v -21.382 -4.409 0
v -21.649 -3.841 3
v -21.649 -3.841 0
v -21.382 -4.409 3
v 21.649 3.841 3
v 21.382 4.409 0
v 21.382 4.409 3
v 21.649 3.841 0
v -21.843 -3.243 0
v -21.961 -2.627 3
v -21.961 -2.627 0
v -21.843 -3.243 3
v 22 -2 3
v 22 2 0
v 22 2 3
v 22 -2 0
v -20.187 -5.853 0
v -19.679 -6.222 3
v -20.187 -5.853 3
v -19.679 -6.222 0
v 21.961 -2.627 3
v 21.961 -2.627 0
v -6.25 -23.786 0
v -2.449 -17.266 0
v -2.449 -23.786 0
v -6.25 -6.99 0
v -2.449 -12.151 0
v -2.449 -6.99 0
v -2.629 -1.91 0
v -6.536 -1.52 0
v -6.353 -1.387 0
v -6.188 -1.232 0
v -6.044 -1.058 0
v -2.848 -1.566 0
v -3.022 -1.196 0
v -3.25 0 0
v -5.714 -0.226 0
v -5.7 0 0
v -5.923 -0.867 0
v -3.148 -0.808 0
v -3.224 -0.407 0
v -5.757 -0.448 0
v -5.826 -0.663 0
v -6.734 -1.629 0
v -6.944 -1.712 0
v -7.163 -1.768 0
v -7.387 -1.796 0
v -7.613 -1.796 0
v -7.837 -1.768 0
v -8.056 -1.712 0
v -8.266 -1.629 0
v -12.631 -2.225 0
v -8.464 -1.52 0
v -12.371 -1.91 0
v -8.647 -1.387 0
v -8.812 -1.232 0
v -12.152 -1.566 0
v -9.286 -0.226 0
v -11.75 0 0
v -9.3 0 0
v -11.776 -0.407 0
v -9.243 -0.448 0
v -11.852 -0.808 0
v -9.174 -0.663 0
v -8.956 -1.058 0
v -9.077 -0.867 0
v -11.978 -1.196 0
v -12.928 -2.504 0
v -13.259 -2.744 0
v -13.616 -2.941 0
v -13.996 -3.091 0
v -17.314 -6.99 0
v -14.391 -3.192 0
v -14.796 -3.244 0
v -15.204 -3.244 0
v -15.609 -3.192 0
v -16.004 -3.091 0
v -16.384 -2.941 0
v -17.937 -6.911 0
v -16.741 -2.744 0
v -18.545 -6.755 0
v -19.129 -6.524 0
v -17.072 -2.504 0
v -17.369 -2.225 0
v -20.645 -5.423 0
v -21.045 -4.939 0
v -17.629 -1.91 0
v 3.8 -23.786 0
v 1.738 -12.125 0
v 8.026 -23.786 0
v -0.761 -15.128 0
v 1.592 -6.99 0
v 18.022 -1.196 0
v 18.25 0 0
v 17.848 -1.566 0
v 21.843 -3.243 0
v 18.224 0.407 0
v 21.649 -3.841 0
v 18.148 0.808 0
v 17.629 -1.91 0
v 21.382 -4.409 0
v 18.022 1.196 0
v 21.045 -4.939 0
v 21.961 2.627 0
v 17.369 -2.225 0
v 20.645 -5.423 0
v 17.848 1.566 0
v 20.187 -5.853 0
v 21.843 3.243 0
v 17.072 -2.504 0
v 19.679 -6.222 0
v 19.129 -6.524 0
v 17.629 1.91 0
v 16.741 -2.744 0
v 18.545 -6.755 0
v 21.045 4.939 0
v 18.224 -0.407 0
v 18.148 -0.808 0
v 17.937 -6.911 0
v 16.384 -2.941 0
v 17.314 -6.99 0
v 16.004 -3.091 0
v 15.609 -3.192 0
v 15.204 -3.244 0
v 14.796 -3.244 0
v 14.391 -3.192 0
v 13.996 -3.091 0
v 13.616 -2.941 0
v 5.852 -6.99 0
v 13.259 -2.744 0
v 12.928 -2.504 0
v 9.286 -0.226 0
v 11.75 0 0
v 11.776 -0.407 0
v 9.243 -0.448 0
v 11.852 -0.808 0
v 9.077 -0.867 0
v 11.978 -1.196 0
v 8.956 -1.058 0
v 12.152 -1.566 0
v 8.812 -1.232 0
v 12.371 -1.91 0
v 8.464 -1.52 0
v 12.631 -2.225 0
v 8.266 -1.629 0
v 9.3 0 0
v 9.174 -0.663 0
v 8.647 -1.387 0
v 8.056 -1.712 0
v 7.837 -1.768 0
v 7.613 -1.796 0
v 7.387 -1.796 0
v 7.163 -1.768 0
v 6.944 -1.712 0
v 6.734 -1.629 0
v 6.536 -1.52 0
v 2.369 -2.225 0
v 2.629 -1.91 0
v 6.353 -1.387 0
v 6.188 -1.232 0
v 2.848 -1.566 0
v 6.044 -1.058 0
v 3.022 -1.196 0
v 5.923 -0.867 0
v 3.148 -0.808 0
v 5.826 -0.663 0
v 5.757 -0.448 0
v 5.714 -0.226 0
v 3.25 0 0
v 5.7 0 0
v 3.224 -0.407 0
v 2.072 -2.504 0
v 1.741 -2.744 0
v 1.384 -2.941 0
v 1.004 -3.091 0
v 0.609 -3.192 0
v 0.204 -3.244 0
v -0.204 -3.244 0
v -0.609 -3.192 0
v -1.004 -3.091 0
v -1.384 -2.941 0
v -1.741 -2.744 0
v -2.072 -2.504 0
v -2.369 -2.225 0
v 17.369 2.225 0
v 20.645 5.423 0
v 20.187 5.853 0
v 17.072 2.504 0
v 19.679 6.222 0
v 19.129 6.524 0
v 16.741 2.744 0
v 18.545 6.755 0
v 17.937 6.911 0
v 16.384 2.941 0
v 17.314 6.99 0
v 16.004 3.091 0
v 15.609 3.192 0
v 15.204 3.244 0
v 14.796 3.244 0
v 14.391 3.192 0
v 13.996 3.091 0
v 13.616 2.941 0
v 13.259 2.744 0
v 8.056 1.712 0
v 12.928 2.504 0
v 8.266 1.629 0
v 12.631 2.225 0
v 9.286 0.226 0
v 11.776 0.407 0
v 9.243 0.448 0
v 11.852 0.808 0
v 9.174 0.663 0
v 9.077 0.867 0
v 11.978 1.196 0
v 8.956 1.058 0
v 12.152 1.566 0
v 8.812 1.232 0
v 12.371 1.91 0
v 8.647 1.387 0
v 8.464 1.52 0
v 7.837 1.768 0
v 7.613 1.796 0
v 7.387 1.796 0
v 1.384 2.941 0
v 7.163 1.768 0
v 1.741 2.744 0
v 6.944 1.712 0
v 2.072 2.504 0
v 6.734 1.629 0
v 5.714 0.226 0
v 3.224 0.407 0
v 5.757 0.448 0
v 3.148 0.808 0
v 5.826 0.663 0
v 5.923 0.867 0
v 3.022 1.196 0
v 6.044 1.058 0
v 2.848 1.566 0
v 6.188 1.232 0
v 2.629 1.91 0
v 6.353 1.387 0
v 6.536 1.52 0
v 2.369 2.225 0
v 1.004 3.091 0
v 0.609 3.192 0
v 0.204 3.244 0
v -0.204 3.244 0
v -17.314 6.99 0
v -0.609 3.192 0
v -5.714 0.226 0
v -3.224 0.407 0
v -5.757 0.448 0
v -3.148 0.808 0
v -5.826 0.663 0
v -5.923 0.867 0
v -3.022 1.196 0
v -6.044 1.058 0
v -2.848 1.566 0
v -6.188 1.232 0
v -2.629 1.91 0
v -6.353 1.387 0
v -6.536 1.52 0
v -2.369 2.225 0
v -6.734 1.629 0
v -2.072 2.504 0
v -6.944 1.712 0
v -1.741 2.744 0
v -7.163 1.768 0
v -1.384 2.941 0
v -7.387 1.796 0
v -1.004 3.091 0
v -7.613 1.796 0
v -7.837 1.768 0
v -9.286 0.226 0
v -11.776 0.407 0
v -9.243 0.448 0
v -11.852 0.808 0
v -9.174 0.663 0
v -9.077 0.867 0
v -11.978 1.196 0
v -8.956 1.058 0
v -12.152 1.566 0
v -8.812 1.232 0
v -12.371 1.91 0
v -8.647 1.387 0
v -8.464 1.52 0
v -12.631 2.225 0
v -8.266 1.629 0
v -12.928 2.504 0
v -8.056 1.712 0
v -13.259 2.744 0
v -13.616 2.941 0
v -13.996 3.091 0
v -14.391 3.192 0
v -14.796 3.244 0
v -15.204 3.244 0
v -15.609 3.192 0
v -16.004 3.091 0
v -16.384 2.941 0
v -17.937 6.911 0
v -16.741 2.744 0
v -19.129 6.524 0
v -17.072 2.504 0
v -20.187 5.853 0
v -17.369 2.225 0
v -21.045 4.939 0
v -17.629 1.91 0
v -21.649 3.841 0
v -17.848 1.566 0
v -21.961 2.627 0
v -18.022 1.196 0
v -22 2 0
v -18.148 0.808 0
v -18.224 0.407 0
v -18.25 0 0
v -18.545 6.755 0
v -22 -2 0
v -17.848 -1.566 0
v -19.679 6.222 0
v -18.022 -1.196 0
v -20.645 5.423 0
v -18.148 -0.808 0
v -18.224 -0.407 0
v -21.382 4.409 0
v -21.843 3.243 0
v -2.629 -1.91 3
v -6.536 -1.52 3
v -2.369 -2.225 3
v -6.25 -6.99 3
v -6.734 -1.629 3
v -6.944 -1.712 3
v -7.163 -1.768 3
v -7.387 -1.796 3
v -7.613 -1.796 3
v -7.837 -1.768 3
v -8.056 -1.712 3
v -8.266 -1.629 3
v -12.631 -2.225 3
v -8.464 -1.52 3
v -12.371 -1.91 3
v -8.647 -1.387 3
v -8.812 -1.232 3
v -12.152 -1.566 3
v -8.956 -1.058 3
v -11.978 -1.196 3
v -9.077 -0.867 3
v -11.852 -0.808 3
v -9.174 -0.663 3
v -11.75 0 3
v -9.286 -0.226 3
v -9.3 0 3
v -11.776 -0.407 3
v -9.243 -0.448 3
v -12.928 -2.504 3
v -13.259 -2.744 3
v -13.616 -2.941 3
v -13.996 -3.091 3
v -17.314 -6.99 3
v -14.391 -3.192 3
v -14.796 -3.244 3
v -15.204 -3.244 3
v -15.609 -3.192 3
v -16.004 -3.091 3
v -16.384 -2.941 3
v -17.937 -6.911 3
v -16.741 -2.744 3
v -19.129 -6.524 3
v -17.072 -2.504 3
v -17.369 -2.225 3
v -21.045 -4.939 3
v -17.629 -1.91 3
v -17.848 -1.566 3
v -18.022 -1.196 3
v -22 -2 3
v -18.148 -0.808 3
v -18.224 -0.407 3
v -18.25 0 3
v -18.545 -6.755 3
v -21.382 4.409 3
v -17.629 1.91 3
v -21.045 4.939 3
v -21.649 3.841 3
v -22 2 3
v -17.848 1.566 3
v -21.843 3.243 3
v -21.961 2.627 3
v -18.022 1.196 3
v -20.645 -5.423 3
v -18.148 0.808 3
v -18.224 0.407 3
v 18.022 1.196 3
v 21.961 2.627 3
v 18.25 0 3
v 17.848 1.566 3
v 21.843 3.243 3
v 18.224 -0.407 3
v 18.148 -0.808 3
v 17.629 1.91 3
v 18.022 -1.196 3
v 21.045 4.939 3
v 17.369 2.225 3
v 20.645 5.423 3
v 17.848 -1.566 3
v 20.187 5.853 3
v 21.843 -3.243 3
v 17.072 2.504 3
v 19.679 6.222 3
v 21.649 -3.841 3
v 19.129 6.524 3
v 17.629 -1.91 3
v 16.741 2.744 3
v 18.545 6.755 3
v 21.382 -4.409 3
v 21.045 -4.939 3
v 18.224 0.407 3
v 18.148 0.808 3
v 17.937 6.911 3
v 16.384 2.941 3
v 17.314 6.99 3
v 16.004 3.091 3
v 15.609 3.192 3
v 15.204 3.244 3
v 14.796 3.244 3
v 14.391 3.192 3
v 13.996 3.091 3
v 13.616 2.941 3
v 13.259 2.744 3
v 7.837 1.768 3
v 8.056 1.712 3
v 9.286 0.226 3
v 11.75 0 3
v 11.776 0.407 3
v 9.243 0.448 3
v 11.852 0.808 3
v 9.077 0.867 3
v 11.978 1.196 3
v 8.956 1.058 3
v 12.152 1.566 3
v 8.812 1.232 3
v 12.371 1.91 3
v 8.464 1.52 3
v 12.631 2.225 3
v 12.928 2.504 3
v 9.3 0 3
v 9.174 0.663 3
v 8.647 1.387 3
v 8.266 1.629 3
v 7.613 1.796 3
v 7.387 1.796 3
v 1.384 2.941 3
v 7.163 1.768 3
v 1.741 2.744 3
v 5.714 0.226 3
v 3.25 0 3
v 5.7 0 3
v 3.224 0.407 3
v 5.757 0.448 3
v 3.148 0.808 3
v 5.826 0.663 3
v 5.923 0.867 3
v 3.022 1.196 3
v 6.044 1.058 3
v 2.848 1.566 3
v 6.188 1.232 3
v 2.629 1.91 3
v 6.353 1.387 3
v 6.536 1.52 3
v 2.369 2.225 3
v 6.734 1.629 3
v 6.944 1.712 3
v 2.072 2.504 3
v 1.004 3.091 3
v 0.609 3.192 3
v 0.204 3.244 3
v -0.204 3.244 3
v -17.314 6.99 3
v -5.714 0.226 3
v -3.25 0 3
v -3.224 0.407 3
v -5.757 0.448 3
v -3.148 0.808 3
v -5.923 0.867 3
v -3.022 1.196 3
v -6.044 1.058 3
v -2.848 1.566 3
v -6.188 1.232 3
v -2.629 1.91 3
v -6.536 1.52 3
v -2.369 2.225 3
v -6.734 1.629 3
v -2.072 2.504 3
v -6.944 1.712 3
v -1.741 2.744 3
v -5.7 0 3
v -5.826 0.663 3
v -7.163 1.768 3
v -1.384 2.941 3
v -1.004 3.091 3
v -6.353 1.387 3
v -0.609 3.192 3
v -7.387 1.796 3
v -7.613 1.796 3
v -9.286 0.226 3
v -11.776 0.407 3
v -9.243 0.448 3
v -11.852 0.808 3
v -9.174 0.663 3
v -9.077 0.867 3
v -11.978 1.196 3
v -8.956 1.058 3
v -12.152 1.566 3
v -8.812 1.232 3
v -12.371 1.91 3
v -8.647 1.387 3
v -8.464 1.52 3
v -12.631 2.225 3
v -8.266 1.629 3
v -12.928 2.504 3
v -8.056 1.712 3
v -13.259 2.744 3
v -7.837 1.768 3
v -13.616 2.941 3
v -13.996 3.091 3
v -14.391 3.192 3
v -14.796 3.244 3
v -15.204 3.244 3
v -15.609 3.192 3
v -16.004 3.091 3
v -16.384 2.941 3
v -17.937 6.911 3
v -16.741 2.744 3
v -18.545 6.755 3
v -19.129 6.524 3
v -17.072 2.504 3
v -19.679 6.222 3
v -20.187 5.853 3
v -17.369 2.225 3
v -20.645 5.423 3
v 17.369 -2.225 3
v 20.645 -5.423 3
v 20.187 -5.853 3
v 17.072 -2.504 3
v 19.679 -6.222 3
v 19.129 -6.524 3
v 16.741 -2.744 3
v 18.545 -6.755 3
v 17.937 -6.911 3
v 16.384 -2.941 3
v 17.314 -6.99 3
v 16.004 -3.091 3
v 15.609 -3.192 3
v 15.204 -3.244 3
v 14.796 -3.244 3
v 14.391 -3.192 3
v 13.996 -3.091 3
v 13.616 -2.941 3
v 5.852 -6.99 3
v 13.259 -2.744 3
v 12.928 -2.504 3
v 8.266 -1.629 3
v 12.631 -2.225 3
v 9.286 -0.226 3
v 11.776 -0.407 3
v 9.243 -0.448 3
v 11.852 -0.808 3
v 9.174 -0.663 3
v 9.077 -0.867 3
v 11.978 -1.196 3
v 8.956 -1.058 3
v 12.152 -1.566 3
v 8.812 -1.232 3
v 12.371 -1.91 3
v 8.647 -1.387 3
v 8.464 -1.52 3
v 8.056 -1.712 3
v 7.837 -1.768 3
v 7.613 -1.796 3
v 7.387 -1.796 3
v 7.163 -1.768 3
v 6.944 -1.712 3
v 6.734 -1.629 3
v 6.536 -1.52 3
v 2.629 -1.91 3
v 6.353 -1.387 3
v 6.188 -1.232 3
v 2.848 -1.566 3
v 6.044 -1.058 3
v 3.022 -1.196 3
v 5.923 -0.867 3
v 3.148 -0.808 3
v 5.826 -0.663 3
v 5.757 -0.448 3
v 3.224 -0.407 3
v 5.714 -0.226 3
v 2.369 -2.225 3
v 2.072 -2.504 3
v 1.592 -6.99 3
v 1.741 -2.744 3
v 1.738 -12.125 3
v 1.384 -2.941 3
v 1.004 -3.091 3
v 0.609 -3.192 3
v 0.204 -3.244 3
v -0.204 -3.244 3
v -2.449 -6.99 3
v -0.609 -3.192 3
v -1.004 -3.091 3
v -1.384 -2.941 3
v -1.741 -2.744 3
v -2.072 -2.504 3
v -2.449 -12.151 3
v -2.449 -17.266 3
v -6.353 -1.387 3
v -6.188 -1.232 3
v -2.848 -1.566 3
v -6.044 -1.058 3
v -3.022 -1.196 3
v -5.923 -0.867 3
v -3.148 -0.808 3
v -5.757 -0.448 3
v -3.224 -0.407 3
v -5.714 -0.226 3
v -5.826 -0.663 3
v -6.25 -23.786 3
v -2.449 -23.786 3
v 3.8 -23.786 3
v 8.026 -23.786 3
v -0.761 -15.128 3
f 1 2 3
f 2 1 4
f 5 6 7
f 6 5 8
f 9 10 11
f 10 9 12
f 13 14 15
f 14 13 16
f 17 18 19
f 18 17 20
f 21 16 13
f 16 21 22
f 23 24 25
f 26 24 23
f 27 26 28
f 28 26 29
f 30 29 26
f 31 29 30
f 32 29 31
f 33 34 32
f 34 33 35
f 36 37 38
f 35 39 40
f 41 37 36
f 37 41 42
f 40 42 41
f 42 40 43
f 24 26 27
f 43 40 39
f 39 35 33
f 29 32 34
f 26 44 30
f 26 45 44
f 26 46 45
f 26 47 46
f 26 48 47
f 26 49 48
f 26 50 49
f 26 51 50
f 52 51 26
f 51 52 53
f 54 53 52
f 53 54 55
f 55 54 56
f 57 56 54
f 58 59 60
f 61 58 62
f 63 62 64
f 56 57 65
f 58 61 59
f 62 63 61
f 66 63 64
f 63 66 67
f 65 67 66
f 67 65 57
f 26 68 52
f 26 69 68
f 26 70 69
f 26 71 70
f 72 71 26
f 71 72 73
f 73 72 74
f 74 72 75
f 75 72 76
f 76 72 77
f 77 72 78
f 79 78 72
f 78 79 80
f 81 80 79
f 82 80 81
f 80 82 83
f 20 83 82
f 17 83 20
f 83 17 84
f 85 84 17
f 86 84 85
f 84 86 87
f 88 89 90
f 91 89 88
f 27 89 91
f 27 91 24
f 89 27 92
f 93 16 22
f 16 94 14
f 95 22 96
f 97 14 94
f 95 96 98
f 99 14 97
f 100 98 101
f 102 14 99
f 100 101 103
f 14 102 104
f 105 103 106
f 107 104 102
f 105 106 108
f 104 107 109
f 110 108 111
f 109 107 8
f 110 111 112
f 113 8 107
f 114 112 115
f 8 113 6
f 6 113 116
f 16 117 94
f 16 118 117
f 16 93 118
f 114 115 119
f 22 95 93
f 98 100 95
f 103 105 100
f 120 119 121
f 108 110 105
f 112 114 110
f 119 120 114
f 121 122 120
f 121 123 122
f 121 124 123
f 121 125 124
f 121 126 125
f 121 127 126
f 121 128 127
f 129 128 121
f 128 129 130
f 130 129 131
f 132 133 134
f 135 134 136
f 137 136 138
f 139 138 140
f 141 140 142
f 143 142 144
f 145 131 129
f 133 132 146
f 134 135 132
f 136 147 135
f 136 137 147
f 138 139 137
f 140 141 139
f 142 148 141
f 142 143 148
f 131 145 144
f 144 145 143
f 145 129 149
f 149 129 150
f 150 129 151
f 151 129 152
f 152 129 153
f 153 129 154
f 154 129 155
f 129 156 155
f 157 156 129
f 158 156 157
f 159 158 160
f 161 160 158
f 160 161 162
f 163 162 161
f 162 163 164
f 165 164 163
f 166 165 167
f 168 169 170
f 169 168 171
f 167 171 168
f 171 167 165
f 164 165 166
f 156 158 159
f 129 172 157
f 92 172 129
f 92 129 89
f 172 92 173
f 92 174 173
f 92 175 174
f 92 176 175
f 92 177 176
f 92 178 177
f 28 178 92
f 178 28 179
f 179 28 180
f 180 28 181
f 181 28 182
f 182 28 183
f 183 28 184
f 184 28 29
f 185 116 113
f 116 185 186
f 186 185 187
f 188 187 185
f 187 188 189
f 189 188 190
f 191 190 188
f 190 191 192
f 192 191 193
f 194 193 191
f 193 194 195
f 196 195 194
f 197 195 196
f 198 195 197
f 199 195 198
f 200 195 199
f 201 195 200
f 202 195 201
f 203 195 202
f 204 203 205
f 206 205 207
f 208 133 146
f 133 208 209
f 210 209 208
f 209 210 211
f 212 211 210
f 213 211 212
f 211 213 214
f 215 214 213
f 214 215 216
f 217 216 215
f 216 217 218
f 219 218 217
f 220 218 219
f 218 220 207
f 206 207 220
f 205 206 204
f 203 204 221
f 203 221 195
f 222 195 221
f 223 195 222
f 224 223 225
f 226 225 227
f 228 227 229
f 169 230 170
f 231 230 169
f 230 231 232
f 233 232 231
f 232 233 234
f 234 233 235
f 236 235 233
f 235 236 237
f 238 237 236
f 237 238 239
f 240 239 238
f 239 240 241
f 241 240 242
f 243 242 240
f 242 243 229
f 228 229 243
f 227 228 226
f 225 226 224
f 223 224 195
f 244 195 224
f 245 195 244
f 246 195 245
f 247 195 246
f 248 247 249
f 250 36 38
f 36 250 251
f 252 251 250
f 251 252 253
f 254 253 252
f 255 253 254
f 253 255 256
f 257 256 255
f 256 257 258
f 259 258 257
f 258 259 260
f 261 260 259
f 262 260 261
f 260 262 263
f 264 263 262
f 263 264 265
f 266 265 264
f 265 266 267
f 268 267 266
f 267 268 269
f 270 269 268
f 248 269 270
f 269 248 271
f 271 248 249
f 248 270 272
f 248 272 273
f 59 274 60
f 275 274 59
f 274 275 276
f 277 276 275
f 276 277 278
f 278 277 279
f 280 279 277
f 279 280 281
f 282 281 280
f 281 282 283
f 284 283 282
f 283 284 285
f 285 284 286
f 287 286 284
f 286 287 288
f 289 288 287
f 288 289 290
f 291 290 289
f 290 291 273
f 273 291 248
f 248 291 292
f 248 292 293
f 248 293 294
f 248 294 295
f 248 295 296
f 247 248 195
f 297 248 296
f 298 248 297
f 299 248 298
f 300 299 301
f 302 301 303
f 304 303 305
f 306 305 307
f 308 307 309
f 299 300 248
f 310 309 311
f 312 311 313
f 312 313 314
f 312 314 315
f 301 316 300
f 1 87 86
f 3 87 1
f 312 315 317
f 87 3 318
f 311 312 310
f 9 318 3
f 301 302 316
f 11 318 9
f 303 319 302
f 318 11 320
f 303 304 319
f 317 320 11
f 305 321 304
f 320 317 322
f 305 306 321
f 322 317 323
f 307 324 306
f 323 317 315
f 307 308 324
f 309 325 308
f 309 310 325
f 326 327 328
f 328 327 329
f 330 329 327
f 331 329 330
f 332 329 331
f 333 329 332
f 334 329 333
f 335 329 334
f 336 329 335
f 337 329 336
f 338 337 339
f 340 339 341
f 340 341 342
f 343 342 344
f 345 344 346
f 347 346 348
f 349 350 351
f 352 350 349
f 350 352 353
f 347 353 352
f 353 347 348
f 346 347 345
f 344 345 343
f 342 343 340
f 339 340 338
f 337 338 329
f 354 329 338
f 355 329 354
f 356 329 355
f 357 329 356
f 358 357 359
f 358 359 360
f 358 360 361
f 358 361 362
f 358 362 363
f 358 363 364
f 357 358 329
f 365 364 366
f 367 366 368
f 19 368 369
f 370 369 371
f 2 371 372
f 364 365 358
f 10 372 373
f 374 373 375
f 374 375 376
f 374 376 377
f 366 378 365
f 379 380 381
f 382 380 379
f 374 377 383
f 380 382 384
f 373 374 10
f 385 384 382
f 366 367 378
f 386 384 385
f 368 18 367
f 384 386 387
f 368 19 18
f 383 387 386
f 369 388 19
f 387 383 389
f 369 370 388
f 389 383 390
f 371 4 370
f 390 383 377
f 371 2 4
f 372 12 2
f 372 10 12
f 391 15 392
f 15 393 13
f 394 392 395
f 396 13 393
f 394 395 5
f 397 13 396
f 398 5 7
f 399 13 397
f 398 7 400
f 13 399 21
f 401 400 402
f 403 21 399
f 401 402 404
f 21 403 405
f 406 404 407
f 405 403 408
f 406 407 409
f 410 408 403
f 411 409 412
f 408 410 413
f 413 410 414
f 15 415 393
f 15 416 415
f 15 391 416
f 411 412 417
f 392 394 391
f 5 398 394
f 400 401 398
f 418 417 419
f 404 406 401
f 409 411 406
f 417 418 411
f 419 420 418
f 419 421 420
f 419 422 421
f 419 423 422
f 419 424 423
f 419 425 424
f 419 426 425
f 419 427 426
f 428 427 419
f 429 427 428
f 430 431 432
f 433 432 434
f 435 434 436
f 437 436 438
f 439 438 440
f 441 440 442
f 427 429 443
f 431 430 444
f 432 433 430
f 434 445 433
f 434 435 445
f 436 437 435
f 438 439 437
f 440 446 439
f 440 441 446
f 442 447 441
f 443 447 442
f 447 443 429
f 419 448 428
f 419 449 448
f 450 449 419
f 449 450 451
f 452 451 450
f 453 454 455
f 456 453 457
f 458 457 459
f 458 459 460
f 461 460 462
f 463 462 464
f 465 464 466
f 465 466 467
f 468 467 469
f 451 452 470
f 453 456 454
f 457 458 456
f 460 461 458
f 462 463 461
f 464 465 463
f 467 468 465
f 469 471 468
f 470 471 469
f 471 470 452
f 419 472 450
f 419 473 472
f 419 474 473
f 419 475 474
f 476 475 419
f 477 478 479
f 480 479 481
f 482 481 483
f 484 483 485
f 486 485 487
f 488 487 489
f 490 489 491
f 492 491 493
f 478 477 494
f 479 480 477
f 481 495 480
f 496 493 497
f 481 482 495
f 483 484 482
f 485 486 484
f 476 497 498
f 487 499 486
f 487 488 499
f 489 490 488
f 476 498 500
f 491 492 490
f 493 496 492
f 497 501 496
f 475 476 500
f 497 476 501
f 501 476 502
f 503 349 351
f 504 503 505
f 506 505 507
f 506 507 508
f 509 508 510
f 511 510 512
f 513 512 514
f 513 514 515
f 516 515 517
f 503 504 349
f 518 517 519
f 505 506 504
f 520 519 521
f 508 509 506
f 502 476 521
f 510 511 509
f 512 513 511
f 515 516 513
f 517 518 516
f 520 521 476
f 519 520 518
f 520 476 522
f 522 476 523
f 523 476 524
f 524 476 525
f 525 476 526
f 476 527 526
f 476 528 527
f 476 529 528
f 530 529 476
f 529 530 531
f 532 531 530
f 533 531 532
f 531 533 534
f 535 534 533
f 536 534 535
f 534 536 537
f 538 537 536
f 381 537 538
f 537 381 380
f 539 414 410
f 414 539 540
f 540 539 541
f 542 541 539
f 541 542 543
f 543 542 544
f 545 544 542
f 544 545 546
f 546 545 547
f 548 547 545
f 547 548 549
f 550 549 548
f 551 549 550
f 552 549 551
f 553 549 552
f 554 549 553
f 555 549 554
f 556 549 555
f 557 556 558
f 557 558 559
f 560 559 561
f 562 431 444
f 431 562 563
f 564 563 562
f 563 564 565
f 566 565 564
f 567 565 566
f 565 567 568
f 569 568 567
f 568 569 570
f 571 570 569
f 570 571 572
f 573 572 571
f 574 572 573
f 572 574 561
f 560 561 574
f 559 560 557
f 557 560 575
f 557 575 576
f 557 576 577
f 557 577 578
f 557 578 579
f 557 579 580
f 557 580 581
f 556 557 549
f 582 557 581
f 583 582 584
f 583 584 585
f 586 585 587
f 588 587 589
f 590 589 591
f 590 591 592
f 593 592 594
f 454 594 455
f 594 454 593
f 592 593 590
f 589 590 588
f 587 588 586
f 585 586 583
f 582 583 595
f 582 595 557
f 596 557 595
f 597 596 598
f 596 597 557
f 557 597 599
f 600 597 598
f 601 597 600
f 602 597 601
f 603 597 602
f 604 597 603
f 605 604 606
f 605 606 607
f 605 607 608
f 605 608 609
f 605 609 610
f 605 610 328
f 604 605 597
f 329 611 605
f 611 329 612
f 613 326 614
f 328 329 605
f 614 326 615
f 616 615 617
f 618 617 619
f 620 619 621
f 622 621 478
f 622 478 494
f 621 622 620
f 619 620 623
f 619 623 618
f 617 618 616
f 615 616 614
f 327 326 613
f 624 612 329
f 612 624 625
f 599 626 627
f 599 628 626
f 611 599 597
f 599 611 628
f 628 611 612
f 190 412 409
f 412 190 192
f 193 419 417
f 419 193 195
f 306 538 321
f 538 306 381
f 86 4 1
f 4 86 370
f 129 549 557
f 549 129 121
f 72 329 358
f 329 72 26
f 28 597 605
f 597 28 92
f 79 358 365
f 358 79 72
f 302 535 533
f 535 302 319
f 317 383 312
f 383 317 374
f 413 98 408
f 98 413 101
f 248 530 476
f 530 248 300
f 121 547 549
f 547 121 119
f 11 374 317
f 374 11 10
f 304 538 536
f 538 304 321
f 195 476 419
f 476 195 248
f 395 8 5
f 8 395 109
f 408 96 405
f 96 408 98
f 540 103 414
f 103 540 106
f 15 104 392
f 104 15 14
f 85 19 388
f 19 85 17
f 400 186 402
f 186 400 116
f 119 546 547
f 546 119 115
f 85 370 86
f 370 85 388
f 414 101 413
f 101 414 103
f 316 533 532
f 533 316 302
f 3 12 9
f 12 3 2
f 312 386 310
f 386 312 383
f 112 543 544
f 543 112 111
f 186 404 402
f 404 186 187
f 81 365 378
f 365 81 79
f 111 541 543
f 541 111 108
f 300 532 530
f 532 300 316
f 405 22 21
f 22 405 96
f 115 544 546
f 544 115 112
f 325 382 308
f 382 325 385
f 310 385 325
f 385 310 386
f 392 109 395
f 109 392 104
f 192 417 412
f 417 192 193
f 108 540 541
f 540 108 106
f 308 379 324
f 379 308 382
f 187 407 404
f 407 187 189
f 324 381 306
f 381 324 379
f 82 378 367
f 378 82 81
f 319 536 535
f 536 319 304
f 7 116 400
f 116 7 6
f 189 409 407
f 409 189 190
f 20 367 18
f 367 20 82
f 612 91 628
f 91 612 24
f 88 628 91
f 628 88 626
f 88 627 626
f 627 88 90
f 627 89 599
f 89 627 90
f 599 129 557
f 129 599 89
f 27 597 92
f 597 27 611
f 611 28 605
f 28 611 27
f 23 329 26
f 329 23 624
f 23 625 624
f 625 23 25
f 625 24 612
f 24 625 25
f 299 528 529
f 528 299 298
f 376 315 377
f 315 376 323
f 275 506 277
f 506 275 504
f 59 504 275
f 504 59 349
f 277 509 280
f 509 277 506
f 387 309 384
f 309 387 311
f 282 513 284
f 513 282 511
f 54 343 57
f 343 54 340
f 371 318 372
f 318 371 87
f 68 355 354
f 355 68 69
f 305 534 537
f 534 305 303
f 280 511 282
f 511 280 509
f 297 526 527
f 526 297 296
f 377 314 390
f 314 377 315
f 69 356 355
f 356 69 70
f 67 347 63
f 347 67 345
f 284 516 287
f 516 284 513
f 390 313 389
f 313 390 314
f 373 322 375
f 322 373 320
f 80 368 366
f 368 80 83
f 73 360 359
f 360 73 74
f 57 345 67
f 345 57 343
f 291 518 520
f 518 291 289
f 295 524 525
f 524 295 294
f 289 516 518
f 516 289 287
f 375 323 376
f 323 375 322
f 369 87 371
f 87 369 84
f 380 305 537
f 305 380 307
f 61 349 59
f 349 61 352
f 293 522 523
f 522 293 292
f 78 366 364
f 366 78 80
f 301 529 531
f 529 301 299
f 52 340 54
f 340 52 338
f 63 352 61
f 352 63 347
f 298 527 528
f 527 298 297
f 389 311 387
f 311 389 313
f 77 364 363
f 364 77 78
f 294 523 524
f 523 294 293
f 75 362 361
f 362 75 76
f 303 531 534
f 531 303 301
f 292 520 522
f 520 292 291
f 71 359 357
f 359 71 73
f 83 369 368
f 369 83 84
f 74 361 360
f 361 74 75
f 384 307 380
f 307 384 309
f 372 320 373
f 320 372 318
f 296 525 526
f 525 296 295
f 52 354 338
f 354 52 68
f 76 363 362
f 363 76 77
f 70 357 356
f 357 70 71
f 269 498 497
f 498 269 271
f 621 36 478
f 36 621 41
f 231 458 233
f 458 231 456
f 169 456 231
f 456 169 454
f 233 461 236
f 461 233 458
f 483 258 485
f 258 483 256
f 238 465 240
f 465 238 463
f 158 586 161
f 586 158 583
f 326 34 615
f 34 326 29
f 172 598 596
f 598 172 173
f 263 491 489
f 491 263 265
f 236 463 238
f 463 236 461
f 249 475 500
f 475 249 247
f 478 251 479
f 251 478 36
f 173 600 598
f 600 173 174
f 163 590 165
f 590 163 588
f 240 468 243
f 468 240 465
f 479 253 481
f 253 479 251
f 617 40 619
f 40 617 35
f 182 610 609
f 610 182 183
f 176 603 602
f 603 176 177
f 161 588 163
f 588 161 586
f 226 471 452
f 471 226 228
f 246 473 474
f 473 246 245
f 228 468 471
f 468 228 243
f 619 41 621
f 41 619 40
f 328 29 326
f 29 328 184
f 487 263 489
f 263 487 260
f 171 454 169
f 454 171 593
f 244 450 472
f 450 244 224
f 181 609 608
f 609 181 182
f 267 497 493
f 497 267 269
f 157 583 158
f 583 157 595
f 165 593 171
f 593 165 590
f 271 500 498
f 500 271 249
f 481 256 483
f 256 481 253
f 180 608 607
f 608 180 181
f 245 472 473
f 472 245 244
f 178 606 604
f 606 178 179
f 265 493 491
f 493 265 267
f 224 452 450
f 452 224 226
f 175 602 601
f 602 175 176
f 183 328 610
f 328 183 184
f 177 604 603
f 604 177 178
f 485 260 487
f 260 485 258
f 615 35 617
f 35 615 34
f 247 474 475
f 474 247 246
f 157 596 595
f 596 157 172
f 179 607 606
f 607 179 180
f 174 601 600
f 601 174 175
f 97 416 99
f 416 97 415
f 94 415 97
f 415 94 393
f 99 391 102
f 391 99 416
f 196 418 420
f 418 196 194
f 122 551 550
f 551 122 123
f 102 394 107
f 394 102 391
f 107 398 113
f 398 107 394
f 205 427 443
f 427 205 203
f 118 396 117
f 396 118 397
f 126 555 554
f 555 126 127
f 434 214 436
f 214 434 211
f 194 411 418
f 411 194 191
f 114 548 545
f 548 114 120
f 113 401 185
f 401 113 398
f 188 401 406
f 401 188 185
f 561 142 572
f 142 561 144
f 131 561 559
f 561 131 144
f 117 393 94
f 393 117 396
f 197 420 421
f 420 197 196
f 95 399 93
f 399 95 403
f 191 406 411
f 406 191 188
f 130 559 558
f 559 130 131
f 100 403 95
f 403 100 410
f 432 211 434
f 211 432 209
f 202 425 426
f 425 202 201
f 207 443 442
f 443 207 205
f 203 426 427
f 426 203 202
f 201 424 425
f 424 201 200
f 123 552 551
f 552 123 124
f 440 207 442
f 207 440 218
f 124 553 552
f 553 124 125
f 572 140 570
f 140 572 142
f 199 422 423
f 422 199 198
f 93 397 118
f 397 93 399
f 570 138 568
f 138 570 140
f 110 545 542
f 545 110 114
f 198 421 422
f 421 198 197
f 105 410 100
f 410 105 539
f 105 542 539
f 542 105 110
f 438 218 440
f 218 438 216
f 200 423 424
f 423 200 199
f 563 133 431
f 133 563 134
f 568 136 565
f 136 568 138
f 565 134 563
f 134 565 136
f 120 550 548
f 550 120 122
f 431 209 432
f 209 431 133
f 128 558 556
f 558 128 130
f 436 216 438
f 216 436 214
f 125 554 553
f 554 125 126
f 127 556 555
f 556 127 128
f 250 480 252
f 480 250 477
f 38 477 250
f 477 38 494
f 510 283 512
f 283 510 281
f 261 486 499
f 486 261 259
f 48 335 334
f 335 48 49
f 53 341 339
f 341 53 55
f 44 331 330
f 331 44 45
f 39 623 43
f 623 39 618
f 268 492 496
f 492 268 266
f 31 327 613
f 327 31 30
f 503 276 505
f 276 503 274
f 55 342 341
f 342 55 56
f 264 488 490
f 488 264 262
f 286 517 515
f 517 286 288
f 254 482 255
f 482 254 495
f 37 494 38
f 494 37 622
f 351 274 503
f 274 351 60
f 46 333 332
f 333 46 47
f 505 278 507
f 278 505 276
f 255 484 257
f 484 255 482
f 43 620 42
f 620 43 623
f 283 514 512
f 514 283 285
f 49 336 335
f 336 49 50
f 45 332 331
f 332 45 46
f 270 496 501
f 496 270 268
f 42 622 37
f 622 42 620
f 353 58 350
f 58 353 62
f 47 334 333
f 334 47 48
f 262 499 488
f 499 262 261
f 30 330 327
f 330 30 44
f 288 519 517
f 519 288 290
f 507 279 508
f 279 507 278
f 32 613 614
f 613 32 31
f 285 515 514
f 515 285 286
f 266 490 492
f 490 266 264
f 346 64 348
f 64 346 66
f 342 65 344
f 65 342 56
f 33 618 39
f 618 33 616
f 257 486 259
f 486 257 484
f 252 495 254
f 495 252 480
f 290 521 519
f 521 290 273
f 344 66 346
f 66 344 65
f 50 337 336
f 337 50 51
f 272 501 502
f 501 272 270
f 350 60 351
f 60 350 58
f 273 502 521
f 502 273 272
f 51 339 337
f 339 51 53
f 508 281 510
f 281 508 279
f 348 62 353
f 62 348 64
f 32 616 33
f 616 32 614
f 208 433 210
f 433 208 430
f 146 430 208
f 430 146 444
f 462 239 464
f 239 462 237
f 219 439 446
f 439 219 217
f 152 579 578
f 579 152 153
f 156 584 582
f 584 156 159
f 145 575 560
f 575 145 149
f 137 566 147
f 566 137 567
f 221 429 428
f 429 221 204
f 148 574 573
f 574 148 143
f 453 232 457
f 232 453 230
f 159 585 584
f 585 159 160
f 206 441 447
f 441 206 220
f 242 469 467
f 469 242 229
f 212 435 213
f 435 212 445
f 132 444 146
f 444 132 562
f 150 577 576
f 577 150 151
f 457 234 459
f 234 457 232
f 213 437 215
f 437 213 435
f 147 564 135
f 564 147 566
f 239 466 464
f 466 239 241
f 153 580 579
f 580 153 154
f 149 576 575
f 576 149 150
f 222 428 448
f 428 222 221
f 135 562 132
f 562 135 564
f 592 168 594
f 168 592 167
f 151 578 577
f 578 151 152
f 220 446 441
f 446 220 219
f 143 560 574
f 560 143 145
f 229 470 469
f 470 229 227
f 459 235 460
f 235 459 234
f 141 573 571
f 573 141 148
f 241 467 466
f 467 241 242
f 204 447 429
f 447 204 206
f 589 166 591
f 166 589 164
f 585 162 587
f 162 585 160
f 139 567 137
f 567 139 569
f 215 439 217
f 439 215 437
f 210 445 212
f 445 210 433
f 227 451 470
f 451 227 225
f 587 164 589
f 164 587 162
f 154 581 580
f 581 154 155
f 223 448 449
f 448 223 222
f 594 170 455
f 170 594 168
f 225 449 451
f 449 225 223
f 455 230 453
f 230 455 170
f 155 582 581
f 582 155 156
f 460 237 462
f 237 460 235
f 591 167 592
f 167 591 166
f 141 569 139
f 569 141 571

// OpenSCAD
$fn = 50;


difference() {
	union() {
		hull() {
			translate(v = [-17.0000000000, 2.0000000000, 0]) {
				cylinder(h = 3, r = 5);
			}
			translate(v = [17.0000000000, 2.0000000000, 0]) {
				cylinder(h = 3, r = 5);
			}
			translate(v = [-17.0000000000, -2.0000000000, 0]) {
				cylinder(h = 3, r = 5);
			}
			translate(v = [17.0000000000, -2.0000000000, 0]) {
				cylinder(h = 3, r = 5);
			}
		}
		translate(v = [0, -5, 0]) {
			linear_extrude(height = 3) {
				text(font = "DejaVu Sans Mono:style=Bold", halign = "center", size = 19.0000000000, text = "K", valign = "top");
			}
		}
	}
	union() {
		translate(v = [-15.0000000000, 0.0000000000, 0]) {
			translate(v = [0, 0, -100]) {
				cylinder(h = 200, r = 3.2500000000);
			}
		}
		translate(v = [0, 0, -100]) {
			cylinder(h = 200, r = 3.2500000000);
		}
		translate(v = [15.0000000000, 0.0000000000, 0]) {
			translate(v = [0, 0, -100]) {
				cylinder(h = 200, r = 3.2500000000);
			}
		}
		translate(v = [-15.0000000000, 0.0000000000, 0]) {
			translate(v = [0, 0, -100]) {
				cylinder(h = 200, r = 1.8000000000);
			}
		}
		translate(v = [-7.5000000000, 0.0000000000, 0]) {
			translate(v = [0, 0, -100]) {
				cylinder(h = 200, r = 1.8000000000);
			}
		}
		translate(v = [0, 0, -100]) {
			cylinder(h = 200, r = 1.8000000000);
		}
		translate(v = [7.5000000000, 0.0000000000, 0]) {
			translate(v = [0, 0, -100]) {
				cylinder(h = 200, r = 1.8000000000);
			}
		}
		translate(v = [15.0000000000, 0.0000000000, 0]) {
			translate(v = [0, 0, -100]) {
				cylinder(h = 200, r = 1.8000000000);
			}
		}
	}
}
